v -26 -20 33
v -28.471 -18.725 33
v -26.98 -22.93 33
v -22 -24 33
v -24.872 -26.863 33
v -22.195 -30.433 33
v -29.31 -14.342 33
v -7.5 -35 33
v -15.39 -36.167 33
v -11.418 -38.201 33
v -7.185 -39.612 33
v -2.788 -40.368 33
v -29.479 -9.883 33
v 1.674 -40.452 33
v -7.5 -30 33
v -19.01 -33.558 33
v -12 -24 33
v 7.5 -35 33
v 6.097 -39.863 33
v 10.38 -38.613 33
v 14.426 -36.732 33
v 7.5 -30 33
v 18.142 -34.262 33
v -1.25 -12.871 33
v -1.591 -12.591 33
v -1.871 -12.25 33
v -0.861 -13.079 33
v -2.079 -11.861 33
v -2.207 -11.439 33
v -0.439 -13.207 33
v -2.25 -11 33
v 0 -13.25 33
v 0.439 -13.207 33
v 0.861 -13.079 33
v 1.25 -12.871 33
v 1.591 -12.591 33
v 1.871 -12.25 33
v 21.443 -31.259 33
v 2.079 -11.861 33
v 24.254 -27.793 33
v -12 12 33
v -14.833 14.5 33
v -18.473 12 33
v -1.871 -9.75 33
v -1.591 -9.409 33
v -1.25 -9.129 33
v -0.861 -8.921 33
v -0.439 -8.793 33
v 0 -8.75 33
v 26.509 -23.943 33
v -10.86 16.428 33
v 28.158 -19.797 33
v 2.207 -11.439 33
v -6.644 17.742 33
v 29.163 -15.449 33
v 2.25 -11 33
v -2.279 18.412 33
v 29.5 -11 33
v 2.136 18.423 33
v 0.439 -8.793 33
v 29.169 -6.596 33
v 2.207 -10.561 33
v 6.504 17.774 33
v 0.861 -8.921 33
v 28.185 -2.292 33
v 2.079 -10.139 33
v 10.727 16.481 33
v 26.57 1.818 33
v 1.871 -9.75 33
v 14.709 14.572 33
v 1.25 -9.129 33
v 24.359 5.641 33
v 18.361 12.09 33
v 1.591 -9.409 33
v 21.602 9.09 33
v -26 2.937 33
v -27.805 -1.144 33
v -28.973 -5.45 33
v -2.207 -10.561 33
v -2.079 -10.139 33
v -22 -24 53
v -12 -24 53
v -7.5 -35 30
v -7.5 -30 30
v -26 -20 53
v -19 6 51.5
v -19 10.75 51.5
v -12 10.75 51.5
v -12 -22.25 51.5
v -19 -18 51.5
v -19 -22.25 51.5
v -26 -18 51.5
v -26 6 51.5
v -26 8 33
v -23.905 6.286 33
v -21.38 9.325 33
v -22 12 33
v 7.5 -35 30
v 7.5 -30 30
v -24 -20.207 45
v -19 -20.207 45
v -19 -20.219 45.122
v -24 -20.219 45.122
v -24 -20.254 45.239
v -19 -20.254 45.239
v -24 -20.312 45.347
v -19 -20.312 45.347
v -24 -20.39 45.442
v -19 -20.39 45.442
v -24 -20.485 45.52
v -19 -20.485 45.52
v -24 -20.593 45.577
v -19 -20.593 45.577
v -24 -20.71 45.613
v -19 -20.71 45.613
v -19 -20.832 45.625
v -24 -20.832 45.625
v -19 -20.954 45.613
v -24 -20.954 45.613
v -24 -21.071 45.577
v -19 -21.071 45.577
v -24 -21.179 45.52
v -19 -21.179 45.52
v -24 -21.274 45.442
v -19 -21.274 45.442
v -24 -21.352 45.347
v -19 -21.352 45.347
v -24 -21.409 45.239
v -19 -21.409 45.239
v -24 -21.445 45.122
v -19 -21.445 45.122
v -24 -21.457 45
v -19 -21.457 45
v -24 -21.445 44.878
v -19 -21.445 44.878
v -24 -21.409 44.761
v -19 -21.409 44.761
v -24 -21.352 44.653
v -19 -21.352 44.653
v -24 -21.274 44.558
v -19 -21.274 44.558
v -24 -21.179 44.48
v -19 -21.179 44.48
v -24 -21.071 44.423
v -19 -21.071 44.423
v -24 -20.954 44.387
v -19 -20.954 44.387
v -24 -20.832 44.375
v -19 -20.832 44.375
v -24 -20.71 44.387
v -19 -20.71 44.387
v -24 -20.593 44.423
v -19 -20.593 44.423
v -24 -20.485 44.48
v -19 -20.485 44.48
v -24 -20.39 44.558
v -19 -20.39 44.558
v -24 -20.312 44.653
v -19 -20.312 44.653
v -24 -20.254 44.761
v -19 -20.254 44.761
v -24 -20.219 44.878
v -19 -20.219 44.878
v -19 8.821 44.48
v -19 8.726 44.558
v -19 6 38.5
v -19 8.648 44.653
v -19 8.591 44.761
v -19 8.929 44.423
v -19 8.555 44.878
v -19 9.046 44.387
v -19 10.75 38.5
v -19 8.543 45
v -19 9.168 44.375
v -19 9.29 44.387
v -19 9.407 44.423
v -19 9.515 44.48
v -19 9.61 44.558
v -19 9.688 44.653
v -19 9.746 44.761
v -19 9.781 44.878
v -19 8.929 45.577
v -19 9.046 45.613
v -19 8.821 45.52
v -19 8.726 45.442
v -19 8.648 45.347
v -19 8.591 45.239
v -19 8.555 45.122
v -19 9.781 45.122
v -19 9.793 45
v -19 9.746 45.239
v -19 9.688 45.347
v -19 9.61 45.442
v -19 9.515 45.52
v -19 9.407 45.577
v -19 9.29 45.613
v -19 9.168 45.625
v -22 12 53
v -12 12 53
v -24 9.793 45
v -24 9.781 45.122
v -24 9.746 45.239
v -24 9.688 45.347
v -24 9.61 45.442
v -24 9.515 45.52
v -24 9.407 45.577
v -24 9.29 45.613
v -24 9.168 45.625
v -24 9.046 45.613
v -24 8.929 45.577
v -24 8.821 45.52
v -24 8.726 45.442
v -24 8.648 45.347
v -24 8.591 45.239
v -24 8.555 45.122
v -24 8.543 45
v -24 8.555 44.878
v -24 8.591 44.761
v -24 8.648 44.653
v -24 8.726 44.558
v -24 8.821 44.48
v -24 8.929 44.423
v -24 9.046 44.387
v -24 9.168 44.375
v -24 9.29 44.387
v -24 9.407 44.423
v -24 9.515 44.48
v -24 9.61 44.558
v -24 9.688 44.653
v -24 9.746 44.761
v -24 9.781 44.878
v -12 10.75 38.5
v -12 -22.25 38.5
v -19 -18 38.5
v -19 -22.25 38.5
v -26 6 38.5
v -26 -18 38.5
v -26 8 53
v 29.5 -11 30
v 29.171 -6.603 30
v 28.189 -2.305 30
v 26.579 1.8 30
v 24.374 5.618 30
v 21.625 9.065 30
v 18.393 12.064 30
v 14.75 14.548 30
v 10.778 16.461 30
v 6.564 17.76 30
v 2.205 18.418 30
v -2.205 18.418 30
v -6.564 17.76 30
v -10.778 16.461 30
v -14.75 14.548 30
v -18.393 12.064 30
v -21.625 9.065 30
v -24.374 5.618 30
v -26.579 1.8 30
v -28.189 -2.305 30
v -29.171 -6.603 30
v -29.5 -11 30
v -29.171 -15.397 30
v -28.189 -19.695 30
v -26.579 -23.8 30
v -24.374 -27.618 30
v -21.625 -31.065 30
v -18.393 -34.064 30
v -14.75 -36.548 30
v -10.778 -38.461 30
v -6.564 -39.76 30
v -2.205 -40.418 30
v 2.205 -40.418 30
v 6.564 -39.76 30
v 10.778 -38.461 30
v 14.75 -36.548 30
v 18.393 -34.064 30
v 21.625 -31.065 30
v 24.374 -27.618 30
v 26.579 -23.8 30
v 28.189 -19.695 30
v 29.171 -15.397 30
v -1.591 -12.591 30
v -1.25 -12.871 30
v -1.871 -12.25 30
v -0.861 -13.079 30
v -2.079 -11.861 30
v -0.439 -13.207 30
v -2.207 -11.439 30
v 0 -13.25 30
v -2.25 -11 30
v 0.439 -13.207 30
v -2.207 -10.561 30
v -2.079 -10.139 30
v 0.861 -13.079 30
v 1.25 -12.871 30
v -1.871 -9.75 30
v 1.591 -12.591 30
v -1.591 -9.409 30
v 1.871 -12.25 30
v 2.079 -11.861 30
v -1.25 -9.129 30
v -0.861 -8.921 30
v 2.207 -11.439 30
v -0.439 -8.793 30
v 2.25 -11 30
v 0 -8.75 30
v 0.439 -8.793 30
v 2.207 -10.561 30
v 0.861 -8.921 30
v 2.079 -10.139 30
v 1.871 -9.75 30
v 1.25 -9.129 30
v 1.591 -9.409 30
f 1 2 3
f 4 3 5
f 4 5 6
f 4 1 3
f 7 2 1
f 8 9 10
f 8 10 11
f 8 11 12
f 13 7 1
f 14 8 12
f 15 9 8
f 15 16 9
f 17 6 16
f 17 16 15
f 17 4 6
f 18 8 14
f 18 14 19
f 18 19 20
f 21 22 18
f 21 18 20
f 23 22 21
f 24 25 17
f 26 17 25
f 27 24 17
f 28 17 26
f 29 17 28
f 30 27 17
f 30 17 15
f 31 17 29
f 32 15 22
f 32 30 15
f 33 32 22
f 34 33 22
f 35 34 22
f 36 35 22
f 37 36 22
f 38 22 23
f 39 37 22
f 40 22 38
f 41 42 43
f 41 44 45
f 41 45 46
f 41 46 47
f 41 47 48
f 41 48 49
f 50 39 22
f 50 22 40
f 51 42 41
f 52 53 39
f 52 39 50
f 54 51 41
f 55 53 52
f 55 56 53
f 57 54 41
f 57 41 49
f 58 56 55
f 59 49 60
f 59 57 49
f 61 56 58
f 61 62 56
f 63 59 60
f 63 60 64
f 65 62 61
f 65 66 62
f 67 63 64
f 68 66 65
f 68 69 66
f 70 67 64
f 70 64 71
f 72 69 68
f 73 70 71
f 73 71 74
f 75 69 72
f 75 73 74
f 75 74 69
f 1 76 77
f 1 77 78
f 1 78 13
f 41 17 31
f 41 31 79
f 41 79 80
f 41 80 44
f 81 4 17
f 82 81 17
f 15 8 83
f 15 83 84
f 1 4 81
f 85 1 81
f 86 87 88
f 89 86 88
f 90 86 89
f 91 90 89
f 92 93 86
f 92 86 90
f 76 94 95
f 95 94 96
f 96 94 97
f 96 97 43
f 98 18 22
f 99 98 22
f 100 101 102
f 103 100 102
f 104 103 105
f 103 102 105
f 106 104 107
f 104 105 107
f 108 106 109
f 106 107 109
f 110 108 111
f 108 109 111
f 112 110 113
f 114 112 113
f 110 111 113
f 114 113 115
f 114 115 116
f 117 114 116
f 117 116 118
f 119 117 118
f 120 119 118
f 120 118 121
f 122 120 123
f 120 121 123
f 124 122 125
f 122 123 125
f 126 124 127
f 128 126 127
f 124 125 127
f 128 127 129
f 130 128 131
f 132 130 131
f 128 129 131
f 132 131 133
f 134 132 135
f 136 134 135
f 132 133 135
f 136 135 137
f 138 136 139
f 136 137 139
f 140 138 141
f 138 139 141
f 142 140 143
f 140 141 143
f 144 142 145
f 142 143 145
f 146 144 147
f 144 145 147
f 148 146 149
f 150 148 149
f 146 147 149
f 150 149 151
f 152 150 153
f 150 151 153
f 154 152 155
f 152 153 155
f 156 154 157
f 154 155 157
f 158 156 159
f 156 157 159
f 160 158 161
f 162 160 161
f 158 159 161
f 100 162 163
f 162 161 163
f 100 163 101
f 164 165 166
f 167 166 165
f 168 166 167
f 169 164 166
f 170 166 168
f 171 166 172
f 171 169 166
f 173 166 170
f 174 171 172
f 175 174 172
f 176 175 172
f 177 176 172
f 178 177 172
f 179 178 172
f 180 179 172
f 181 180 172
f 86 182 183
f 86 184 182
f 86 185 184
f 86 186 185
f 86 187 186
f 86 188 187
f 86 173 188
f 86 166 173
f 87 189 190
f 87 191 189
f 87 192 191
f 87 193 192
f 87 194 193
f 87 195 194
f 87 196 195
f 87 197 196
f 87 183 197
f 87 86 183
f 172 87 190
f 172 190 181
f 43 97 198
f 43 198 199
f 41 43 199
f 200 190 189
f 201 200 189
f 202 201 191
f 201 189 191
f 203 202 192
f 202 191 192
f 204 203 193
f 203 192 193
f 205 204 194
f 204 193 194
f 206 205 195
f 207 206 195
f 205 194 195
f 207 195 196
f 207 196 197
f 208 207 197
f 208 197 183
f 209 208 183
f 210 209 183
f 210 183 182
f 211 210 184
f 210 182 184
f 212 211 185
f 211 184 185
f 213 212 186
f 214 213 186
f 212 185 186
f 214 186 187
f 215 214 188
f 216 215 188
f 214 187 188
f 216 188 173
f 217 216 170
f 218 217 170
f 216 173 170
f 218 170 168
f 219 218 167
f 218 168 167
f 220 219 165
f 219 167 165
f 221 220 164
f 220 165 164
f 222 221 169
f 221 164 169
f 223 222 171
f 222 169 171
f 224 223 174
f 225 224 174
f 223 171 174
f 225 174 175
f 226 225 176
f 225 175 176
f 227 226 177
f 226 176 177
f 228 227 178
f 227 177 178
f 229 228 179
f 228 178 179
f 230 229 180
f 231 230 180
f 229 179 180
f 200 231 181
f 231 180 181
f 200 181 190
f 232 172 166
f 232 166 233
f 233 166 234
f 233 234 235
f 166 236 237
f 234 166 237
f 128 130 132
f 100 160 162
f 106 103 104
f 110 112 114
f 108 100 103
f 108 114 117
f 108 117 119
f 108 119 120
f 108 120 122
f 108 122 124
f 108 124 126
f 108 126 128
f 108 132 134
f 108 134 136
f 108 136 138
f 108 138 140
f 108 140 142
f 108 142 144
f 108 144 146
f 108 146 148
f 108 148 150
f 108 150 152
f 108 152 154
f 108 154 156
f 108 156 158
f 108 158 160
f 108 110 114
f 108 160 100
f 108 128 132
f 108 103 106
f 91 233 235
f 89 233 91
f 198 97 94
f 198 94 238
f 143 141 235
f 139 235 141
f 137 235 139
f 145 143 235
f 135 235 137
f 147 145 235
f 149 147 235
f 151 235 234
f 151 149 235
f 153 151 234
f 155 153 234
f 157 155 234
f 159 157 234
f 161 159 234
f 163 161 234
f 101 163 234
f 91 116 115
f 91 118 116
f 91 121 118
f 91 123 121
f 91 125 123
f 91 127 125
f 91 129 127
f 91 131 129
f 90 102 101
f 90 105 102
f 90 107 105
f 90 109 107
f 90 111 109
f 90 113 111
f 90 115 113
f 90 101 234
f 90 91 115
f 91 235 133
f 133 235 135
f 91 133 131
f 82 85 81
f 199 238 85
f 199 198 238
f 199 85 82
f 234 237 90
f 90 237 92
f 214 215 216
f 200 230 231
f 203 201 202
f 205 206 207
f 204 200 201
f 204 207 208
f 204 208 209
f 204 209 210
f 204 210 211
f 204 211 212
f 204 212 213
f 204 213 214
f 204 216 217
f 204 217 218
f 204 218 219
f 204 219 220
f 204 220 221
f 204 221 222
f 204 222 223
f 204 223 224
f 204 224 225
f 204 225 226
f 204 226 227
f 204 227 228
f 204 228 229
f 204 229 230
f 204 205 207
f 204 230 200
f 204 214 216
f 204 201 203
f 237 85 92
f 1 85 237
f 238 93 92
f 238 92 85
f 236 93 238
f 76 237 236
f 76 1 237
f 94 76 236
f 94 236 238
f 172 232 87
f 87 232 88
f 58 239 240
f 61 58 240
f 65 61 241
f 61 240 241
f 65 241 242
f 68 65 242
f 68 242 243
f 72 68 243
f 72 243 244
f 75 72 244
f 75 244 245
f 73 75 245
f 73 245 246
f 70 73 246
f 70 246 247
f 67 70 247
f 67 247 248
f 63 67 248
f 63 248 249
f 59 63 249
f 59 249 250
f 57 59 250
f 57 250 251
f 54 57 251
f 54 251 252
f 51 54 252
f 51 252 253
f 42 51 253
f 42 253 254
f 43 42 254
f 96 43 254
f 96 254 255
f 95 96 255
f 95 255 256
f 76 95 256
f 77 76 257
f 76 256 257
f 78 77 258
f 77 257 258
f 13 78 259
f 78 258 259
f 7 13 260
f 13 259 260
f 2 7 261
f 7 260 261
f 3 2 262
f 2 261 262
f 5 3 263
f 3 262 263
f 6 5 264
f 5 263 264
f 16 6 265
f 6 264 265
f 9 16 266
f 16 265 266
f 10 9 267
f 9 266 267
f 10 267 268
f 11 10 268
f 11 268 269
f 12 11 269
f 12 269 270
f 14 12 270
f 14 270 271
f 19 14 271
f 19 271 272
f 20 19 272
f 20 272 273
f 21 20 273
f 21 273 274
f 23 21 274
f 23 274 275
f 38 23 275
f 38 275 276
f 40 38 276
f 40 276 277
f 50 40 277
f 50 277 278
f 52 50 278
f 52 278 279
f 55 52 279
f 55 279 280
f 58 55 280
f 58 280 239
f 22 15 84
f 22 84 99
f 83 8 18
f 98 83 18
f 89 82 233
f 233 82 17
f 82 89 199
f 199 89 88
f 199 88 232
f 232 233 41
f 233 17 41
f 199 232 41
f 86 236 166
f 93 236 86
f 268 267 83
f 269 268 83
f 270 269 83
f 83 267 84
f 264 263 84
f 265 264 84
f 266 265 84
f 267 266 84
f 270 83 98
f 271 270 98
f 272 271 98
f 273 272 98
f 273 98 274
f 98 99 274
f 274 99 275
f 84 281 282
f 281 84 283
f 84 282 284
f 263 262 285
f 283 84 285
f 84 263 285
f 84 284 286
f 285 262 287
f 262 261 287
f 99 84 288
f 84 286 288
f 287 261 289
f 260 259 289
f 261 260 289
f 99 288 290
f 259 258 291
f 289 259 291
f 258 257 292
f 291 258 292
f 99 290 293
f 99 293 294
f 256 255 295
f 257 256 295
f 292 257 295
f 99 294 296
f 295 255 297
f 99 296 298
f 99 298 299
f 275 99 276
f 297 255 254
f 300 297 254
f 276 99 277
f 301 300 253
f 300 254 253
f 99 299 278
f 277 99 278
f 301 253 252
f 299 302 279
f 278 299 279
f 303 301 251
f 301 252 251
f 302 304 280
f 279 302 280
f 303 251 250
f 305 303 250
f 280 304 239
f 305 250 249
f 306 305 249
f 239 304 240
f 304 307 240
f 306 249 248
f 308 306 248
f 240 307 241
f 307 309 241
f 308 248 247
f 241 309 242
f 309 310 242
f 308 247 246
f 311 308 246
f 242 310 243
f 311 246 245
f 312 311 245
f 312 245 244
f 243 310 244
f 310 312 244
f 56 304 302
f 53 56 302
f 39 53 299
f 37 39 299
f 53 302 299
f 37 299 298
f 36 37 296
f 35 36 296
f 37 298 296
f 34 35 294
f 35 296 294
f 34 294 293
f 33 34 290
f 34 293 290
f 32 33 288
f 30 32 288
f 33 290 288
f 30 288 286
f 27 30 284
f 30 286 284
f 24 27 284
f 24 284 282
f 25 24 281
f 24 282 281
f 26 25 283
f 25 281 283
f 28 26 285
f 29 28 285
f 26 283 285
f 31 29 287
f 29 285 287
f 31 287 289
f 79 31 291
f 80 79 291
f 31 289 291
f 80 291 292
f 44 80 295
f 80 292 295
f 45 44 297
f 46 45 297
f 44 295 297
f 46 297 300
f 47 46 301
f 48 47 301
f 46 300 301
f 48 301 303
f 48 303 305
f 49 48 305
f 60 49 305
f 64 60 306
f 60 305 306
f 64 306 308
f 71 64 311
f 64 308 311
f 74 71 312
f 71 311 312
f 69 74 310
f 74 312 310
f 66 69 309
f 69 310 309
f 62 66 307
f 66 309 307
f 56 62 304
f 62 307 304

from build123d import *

# Parameters (mm, degrees)
SKETCH046_R     = 29.5
PAD016_DEPTH    = 3
SKETCH047_R     = 2.25
POCKET027_DEPTH = 3
SKETCH048_W     = 15
SKETCH048_H     = 5
POCKET028_DEPTH = 5
SKETCH050_W     = 14
SKETCH050_H     = 36
PAD017_DEPTH    = 20
SKETCH051_W     = 24
SKETCH051_H     = 13
POCKET030_DEPTH = 14
SKETCH052_W     = 33
SKETCH052_H     = 13
POCKET031_DEPTH = 7
SKETCH053_R     = 0.625
POCKET032_DEPTH = 5
CHAMFER001_SIZE = 4


with BuildPart() as part:
    # Sketch046 → Pad016 (new body)
    with BuildSketch(Plane.XY):
        with Locations((0, -11)):
            Circle(SKETCH046_R)
    extrude(amount=PAD016_DEPTH)

    # Sketch047 (on Face2 of Pad016) → Pocket027 (cut)
    with BuildSketch(Plane(origin=(0, 0, 0), x_dir=(1, 0, 0), z_dir=(0, 0, -1))):
        with Locations((0, 11)):
            Circle(SKETCH047_R)
    extrude(amount=-POCKET027_DEPTH, mode=Mode.SUBTRACT)

    # Sketch048 (on Face3 of Pocket027) → Pocket028 (cut)
    with BuildSketch(Plane.XY.offset(3)):
        with Locations((0, -32.5)):
            Rectangle(SKETCH048_W, SKETCH048_H)
    extrude(amount=-POCKET028_DEPTH, mode=Mode.SUBTRACT)

    # Sketch050 (on Face3 of Pocket028) → Pad017 (join)
    with BuildSketch(Plane.XY.offset(3)):
        with Locations((-19, -6)):
            Rectangle(SKETCH050_W, SKETCH050_H)
    extrude(amount=PAD017_DEPTH)

    # Sketch051 (on Face10 of Pad017) → Pocket030 (cut)
    with BuildSketch(Plane(origin=(-26, 0, 0), x_dir=(0, -1, 0), z_dir=(-1, 0, 0))):
        with Locations((6, 15)):
            Rectangle(SKETCH051_W, SKETCH051_H)
    extrude(amount=-POCKET030_DEPTH, mode=Mode.SUBTRACT)

    # Sketch052 (on Face12 of Pocket030) → Pocket031 (cut)
    with BuildSketch(Plane.YZ.offset(-12)):
        with Locations((-5.75, 15)):
            Rectangle(SKETCH052_W, SKETCH052_H)
    extrude(amount=-POCKET031_DEPTH, mode=Mode.SUBTRACT)

    # Sketch053 (on Face27 of Pocket031) → Pocket032 (cut)
    with BuildSketch(Plane.YZ.offset(-19)):
        with Locations((-20.831921, 15)):
            Circle(SKETCH053_R)
        with Locations((9.168079, 15)):
            Circle(SKETCH053_R)
    extrude(amount=-POCKET032_DEPTH, mode=Mode.SUBTRACT)

    # Chamfer001
    chamfer001_edges = [part.edges().sort_by_distance(p)[0] for p in [
        (-26, 12, 13),
        (-26, -24, 13),
    ]]
    chamfer(chamfer001_edges, length=CHAMFER001_SIZE)


with BuildPart() as part_1:
    # Body003 placement: moved
    add(part.part.moved(Location((0, 0, 30))))


solid = part_1.part
